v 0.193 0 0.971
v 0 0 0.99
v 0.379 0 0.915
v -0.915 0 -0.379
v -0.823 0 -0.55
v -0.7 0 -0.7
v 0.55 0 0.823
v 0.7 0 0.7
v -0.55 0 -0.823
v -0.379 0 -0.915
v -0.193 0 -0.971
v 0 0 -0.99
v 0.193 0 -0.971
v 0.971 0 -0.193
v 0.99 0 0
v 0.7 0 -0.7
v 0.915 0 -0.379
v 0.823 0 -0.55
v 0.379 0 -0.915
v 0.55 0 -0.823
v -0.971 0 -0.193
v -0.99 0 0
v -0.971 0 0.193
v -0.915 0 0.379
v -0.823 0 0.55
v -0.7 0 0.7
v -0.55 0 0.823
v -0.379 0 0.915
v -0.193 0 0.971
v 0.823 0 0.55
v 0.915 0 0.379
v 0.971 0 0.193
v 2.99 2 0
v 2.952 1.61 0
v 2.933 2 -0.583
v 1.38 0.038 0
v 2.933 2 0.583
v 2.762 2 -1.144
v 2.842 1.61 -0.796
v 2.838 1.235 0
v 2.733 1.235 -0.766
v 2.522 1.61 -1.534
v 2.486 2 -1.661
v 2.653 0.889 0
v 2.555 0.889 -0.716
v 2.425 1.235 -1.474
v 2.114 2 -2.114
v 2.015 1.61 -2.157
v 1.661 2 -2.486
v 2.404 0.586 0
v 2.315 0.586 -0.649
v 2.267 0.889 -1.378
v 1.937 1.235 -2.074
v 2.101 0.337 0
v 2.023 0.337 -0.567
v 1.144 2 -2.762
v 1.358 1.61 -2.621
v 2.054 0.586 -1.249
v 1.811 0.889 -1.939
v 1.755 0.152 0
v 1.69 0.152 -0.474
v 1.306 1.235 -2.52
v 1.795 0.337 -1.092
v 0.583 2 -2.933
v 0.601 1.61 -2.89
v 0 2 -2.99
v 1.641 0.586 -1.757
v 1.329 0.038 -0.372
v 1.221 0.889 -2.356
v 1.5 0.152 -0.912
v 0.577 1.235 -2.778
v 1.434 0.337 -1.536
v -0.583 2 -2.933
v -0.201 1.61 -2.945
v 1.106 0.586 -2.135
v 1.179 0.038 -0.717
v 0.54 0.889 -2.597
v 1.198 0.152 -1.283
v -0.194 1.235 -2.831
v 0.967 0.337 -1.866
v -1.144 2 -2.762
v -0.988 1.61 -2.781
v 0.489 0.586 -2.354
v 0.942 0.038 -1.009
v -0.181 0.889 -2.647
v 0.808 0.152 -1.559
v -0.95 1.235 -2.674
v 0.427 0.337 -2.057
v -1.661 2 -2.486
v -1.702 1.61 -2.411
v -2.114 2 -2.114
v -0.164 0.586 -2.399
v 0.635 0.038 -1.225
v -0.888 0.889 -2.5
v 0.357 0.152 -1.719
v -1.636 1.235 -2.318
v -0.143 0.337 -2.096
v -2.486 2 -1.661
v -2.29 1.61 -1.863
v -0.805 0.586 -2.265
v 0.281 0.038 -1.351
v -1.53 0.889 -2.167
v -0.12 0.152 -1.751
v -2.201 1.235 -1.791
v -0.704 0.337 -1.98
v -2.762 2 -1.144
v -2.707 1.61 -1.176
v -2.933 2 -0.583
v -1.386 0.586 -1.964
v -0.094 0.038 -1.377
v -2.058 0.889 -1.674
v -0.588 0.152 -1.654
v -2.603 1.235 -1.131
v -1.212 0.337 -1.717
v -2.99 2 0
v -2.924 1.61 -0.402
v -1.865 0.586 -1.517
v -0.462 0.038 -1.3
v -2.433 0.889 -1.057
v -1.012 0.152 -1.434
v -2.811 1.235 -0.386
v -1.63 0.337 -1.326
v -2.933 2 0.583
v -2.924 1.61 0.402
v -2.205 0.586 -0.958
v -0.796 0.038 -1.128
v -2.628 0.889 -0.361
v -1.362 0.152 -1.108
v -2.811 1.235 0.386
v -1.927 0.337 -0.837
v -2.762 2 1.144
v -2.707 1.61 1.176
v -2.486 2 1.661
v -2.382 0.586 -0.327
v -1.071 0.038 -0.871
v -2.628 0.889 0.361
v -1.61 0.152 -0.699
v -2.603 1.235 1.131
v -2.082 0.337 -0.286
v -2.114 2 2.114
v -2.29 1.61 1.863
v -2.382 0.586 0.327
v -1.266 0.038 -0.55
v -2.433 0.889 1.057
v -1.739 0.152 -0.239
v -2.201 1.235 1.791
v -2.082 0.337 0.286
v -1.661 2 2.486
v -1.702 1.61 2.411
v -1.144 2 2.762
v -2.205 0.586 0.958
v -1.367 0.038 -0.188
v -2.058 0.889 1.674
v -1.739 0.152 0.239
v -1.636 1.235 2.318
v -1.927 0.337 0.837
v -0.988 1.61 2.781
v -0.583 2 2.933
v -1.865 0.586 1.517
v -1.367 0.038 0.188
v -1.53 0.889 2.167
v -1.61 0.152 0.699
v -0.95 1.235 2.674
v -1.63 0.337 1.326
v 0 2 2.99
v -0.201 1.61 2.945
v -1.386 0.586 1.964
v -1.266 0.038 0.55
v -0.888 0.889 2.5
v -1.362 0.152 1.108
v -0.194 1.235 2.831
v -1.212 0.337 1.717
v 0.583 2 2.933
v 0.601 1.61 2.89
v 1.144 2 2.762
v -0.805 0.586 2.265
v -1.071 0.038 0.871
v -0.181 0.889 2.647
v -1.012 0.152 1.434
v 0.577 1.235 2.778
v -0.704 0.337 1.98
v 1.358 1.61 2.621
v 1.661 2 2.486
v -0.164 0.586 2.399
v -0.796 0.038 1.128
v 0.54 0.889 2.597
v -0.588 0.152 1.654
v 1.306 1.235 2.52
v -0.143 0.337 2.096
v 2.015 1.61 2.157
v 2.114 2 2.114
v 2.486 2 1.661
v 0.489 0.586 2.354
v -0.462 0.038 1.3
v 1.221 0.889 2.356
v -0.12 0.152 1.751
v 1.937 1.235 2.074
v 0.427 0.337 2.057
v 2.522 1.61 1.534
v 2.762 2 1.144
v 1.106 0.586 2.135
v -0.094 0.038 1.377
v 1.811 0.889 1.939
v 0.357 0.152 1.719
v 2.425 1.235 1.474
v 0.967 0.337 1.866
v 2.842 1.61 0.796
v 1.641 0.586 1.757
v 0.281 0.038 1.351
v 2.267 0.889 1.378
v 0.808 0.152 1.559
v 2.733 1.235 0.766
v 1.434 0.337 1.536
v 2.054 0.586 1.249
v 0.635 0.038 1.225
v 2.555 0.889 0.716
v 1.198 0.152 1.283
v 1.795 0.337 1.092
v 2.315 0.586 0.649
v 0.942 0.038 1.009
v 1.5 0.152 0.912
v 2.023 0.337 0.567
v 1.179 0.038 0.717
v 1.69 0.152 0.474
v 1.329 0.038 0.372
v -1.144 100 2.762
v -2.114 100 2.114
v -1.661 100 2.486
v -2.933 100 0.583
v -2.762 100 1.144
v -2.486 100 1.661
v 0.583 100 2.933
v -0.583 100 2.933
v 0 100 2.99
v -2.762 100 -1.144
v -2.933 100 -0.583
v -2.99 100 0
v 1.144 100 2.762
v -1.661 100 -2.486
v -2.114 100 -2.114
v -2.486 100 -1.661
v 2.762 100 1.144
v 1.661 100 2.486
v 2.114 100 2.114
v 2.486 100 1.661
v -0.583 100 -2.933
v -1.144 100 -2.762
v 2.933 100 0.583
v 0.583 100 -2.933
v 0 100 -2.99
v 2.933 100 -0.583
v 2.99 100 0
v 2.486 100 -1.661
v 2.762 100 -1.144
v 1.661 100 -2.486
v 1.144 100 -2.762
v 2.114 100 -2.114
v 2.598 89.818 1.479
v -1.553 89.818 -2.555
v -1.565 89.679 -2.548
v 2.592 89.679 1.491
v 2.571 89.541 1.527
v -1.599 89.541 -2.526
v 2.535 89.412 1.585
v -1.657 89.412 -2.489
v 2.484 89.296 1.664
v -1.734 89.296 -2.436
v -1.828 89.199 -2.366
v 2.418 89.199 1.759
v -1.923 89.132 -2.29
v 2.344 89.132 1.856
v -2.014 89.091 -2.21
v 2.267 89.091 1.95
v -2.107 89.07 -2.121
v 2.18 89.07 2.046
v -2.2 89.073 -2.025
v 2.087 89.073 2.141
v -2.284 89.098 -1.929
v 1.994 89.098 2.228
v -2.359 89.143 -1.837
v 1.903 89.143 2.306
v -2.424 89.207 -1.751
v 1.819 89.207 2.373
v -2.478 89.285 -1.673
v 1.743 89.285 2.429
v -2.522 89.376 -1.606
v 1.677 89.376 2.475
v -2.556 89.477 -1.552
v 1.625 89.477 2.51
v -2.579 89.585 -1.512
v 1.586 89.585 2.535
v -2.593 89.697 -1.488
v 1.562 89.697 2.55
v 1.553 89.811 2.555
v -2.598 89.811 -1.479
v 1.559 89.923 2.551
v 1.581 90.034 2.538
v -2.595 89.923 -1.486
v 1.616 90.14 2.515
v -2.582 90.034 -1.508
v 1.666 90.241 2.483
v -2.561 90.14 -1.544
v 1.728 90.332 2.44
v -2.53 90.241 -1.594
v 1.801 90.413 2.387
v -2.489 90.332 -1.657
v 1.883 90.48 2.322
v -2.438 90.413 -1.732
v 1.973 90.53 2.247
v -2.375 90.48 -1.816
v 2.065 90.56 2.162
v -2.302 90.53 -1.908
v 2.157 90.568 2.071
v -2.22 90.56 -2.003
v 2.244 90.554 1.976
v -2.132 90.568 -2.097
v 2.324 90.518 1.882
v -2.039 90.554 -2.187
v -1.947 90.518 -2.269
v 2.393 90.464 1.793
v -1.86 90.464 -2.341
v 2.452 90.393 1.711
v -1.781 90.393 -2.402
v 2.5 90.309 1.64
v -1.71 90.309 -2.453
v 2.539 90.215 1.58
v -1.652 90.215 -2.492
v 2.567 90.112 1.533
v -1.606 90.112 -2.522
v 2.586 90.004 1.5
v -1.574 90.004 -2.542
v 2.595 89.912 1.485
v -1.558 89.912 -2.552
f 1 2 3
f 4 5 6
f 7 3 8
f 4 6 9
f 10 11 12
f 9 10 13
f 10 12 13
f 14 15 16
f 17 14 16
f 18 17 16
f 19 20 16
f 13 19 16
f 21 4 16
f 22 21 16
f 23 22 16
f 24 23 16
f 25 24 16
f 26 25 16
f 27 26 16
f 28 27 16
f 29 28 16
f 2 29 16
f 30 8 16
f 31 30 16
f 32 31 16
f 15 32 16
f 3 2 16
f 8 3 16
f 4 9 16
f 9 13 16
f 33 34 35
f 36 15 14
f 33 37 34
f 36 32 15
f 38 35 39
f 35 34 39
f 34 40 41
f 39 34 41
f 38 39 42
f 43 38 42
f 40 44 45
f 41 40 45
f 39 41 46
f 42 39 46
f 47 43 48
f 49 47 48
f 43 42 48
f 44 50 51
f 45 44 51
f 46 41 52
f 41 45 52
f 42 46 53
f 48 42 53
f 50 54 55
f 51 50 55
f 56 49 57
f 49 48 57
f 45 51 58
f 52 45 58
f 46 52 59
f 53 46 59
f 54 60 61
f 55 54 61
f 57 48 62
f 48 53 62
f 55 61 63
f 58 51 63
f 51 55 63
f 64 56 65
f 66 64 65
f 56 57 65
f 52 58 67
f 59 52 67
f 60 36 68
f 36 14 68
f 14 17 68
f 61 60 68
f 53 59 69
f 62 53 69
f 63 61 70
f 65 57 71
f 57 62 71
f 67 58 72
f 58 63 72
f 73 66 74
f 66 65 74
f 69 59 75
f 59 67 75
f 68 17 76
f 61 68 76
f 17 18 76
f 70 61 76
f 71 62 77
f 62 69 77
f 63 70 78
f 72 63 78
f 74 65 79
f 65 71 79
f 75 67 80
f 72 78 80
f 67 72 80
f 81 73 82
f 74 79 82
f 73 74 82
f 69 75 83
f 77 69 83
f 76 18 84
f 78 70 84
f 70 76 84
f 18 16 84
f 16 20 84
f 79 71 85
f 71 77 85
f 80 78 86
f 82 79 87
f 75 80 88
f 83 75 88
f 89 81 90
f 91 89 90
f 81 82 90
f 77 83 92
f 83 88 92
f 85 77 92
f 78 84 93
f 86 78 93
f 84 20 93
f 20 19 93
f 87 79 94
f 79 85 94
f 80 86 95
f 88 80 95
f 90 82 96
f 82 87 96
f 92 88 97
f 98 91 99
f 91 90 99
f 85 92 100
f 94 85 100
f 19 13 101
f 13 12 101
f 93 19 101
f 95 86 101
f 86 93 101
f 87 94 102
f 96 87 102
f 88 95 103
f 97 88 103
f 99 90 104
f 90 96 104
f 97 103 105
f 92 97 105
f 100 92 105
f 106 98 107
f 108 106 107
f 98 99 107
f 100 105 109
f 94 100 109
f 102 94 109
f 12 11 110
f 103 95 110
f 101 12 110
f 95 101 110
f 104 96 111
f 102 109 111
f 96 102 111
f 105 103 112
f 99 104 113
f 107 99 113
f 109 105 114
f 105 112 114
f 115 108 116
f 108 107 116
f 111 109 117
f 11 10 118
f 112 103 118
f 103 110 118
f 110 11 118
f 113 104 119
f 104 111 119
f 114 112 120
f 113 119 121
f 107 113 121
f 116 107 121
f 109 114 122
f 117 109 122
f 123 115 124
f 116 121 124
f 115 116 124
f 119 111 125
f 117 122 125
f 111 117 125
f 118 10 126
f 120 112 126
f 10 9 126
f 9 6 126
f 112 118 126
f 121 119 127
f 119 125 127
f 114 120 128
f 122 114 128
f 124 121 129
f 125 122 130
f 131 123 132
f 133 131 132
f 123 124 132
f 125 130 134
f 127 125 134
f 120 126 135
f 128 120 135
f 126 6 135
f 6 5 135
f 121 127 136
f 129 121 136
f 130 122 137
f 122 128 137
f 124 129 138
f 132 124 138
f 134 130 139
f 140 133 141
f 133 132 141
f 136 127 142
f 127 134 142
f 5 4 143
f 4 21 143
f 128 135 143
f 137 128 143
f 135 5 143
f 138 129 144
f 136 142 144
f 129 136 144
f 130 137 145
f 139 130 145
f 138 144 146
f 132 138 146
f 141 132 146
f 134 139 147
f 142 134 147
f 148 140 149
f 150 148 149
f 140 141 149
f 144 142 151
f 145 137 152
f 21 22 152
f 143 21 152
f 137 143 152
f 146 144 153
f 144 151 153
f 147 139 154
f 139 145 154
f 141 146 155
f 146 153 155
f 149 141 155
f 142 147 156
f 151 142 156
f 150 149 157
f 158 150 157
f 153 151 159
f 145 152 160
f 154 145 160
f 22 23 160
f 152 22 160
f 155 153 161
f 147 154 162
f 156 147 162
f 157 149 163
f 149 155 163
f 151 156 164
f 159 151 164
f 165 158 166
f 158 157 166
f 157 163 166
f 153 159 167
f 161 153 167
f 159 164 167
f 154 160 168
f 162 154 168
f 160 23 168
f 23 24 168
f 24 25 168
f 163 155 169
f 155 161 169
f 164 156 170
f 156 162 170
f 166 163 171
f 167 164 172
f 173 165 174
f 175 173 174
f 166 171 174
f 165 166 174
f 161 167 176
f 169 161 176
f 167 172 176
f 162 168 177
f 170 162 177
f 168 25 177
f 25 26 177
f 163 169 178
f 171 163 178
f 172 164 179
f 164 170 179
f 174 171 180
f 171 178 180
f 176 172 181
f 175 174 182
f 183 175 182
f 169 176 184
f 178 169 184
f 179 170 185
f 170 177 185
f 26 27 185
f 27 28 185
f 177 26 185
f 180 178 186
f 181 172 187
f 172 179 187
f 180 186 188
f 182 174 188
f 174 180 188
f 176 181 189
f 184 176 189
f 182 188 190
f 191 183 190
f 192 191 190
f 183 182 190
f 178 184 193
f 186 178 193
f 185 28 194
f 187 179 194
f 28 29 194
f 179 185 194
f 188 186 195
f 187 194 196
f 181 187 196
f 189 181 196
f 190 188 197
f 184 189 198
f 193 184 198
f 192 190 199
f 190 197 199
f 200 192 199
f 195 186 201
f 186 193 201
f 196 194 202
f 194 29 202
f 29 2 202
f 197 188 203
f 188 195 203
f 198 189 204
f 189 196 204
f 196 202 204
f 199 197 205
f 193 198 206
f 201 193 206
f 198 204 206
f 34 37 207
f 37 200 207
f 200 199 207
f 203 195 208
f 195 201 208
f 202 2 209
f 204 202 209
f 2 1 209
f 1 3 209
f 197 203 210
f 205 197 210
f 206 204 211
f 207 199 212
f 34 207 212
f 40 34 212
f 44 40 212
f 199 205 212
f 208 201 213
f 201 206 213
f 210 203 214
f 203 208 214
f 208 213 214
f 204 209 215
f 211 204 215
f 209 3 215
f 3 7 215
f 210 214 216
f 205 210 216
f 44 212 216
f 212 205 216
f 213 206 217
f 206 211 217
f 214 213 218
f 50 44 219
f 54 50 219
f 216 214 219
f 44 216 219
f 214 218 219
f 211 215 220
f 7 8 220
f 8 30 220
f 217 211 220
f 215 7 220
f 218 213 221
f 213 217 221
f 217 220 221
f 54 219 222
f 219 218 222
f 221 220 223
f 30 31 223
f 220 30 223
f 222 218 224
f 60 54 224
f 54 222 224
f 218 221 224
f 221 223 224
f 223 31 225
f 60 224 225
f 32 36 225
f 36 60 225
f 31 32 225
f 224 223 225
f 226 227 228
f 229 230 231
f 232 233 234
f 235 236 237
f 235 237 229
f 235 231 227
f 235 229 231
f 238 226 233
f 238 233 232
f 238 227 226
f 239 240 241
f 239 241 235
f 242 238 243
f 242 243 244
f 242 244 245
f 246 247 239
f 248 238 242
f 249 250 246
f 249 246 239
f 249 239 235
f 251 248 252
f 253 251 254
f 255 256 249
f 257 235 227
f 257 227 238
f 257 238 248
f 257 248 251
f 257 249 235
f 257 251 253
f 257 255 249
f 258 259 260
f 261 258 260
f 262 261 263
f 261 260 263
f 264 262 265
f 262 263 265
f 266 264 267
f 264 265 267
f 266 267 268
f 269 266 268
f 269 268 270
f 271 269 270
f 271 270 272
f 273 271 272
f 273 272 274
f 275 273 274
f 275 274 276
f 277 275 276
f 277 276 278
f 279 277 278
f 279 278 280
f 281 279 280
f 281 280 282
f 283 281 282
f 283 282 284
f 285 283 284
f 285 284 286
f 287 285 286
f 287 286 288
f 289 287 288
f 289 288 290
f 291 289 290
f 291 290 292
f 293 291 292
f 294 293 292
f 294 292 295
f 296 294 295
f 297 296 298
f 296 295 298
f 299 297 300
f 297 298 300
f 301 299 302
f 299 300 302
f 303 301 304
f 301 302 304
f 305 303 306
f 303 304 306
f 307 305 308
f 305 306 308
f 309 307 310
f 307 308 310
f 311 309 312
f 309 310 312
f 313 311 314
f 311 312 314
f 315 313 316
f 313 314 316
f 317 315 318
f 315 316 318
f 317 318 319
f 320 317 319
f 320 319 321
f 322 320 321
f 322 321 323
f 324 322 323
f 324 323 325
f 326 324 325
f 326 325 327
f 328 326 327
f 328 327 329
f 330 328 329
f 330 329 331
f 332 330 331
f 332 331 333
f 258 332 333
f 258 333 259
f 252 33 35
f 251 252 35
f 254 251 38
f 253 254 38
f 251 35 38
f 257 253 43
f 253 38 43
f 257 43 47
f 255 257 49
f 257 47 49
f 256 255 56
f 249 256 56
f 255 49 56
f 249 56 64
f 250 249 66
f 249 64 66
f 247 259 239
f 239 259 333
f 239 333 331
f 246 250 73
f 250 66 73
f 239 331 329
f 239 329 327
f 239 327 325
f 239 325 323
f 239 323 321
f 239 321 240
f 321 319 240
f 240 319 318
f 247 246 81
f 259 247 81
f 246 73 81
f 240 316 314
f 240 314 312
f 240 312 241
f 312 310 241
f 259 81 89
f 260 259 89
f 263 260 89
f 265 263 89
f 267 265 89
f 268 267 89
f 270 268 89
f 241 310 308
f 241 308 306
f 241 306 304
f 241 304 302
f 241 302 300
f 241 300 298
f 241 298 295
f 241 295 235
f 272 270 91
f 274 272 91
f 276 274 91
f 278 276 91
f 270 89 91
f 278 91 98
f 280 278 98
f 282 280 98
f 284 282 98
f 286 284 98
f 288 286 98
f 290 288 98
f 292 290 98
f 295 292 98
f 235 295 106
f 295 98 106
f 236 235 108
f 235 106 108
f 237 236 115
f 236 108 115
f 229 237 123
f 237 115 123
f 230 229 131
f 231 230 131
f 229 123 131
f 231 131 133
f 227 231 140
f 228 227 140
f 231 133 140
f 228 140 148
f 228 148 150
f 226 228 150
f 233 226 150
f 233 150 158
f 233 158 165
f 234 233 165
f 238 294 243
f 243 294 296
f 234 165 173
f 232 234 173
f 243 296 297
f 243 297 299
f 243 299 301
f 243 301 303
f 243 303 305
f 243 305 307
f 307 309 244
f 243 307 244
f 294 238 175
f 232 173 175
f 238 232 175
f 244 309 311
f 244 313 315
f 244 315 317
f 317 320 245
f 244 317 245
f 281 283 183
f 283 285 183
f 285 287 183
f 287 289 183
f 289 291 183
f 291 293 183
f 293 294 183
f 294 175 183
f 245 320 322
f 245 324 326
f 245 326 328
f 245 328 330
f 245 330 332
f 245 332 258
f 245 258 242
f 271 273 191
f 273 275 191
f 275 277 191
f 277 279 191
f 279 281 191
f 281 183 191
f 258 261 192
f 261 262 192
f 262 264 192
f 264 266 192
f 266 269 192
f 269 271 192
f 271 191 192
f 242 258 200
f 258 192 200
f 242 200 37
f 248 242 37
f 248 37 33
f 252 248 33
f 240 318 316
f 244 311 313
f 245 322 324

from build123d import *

# Parameters (mm, degrees)
SKETCH1_R                 = 2.99
BOSS_EXTRUDE1_DEPTH       = 100
F_1_5MM_DOWEL_HOLE5_D     = 1.5
F_1_5MM_DOWEL_HOLE5_DEPTH = 20
F_1_5MM_DOWEL_HOLE5_TIP   = 0.450645464
FILLET1_R                 = 2


with BuildPart() as part:
    # Sketch1 → Boss-Extrude1 (new body)
    with BuildSketch(Plane(origin=(0, 0, 0), x_dir=(1, 0, 0), z_dir=(0, 1, 0))):
        Circle(SKETCH1_R)
    extrude(amount=BOSS_EXTRUDE1_DEPTH)

    # Ø1.5mm Dowel Hole5
    with Locations(Plane(origin=(2.144246544, 89.818322141, 2.083820232), x_dir=(-0.696929844, 0, 0.717139312), z_dir=(0.717139312, 0, 0.696929844))):
        with Locations((0, 0)):
            Hole(F_1_5MM_DOWEL_HOLE5_D / 2, depth=F_1_5MM_DOWEL_HOLE5_DEPTH)
            with Locations((0, 0, -(F_1_5MM_DOWEL_HOLE5_DEPTH + F_1_5MM_DOWEL_HOLE5_TIP / 2))):  # 118° drill point
                Cone(0, F_1_5MM_DOWEL_HOLE5_D / 2, F_1_5MM_DOWEL_HOLE5_TIP, mode=Mode.SUBTRACT)

    # Fillet1
    fillet1_edges = [part.edges().sort_by_distance(p)[0] for p in [
        (-2.99, 0, 0),
    ]]
    fillet(fillet1_edges, radius=FILLET1_R)


solid = part.part
